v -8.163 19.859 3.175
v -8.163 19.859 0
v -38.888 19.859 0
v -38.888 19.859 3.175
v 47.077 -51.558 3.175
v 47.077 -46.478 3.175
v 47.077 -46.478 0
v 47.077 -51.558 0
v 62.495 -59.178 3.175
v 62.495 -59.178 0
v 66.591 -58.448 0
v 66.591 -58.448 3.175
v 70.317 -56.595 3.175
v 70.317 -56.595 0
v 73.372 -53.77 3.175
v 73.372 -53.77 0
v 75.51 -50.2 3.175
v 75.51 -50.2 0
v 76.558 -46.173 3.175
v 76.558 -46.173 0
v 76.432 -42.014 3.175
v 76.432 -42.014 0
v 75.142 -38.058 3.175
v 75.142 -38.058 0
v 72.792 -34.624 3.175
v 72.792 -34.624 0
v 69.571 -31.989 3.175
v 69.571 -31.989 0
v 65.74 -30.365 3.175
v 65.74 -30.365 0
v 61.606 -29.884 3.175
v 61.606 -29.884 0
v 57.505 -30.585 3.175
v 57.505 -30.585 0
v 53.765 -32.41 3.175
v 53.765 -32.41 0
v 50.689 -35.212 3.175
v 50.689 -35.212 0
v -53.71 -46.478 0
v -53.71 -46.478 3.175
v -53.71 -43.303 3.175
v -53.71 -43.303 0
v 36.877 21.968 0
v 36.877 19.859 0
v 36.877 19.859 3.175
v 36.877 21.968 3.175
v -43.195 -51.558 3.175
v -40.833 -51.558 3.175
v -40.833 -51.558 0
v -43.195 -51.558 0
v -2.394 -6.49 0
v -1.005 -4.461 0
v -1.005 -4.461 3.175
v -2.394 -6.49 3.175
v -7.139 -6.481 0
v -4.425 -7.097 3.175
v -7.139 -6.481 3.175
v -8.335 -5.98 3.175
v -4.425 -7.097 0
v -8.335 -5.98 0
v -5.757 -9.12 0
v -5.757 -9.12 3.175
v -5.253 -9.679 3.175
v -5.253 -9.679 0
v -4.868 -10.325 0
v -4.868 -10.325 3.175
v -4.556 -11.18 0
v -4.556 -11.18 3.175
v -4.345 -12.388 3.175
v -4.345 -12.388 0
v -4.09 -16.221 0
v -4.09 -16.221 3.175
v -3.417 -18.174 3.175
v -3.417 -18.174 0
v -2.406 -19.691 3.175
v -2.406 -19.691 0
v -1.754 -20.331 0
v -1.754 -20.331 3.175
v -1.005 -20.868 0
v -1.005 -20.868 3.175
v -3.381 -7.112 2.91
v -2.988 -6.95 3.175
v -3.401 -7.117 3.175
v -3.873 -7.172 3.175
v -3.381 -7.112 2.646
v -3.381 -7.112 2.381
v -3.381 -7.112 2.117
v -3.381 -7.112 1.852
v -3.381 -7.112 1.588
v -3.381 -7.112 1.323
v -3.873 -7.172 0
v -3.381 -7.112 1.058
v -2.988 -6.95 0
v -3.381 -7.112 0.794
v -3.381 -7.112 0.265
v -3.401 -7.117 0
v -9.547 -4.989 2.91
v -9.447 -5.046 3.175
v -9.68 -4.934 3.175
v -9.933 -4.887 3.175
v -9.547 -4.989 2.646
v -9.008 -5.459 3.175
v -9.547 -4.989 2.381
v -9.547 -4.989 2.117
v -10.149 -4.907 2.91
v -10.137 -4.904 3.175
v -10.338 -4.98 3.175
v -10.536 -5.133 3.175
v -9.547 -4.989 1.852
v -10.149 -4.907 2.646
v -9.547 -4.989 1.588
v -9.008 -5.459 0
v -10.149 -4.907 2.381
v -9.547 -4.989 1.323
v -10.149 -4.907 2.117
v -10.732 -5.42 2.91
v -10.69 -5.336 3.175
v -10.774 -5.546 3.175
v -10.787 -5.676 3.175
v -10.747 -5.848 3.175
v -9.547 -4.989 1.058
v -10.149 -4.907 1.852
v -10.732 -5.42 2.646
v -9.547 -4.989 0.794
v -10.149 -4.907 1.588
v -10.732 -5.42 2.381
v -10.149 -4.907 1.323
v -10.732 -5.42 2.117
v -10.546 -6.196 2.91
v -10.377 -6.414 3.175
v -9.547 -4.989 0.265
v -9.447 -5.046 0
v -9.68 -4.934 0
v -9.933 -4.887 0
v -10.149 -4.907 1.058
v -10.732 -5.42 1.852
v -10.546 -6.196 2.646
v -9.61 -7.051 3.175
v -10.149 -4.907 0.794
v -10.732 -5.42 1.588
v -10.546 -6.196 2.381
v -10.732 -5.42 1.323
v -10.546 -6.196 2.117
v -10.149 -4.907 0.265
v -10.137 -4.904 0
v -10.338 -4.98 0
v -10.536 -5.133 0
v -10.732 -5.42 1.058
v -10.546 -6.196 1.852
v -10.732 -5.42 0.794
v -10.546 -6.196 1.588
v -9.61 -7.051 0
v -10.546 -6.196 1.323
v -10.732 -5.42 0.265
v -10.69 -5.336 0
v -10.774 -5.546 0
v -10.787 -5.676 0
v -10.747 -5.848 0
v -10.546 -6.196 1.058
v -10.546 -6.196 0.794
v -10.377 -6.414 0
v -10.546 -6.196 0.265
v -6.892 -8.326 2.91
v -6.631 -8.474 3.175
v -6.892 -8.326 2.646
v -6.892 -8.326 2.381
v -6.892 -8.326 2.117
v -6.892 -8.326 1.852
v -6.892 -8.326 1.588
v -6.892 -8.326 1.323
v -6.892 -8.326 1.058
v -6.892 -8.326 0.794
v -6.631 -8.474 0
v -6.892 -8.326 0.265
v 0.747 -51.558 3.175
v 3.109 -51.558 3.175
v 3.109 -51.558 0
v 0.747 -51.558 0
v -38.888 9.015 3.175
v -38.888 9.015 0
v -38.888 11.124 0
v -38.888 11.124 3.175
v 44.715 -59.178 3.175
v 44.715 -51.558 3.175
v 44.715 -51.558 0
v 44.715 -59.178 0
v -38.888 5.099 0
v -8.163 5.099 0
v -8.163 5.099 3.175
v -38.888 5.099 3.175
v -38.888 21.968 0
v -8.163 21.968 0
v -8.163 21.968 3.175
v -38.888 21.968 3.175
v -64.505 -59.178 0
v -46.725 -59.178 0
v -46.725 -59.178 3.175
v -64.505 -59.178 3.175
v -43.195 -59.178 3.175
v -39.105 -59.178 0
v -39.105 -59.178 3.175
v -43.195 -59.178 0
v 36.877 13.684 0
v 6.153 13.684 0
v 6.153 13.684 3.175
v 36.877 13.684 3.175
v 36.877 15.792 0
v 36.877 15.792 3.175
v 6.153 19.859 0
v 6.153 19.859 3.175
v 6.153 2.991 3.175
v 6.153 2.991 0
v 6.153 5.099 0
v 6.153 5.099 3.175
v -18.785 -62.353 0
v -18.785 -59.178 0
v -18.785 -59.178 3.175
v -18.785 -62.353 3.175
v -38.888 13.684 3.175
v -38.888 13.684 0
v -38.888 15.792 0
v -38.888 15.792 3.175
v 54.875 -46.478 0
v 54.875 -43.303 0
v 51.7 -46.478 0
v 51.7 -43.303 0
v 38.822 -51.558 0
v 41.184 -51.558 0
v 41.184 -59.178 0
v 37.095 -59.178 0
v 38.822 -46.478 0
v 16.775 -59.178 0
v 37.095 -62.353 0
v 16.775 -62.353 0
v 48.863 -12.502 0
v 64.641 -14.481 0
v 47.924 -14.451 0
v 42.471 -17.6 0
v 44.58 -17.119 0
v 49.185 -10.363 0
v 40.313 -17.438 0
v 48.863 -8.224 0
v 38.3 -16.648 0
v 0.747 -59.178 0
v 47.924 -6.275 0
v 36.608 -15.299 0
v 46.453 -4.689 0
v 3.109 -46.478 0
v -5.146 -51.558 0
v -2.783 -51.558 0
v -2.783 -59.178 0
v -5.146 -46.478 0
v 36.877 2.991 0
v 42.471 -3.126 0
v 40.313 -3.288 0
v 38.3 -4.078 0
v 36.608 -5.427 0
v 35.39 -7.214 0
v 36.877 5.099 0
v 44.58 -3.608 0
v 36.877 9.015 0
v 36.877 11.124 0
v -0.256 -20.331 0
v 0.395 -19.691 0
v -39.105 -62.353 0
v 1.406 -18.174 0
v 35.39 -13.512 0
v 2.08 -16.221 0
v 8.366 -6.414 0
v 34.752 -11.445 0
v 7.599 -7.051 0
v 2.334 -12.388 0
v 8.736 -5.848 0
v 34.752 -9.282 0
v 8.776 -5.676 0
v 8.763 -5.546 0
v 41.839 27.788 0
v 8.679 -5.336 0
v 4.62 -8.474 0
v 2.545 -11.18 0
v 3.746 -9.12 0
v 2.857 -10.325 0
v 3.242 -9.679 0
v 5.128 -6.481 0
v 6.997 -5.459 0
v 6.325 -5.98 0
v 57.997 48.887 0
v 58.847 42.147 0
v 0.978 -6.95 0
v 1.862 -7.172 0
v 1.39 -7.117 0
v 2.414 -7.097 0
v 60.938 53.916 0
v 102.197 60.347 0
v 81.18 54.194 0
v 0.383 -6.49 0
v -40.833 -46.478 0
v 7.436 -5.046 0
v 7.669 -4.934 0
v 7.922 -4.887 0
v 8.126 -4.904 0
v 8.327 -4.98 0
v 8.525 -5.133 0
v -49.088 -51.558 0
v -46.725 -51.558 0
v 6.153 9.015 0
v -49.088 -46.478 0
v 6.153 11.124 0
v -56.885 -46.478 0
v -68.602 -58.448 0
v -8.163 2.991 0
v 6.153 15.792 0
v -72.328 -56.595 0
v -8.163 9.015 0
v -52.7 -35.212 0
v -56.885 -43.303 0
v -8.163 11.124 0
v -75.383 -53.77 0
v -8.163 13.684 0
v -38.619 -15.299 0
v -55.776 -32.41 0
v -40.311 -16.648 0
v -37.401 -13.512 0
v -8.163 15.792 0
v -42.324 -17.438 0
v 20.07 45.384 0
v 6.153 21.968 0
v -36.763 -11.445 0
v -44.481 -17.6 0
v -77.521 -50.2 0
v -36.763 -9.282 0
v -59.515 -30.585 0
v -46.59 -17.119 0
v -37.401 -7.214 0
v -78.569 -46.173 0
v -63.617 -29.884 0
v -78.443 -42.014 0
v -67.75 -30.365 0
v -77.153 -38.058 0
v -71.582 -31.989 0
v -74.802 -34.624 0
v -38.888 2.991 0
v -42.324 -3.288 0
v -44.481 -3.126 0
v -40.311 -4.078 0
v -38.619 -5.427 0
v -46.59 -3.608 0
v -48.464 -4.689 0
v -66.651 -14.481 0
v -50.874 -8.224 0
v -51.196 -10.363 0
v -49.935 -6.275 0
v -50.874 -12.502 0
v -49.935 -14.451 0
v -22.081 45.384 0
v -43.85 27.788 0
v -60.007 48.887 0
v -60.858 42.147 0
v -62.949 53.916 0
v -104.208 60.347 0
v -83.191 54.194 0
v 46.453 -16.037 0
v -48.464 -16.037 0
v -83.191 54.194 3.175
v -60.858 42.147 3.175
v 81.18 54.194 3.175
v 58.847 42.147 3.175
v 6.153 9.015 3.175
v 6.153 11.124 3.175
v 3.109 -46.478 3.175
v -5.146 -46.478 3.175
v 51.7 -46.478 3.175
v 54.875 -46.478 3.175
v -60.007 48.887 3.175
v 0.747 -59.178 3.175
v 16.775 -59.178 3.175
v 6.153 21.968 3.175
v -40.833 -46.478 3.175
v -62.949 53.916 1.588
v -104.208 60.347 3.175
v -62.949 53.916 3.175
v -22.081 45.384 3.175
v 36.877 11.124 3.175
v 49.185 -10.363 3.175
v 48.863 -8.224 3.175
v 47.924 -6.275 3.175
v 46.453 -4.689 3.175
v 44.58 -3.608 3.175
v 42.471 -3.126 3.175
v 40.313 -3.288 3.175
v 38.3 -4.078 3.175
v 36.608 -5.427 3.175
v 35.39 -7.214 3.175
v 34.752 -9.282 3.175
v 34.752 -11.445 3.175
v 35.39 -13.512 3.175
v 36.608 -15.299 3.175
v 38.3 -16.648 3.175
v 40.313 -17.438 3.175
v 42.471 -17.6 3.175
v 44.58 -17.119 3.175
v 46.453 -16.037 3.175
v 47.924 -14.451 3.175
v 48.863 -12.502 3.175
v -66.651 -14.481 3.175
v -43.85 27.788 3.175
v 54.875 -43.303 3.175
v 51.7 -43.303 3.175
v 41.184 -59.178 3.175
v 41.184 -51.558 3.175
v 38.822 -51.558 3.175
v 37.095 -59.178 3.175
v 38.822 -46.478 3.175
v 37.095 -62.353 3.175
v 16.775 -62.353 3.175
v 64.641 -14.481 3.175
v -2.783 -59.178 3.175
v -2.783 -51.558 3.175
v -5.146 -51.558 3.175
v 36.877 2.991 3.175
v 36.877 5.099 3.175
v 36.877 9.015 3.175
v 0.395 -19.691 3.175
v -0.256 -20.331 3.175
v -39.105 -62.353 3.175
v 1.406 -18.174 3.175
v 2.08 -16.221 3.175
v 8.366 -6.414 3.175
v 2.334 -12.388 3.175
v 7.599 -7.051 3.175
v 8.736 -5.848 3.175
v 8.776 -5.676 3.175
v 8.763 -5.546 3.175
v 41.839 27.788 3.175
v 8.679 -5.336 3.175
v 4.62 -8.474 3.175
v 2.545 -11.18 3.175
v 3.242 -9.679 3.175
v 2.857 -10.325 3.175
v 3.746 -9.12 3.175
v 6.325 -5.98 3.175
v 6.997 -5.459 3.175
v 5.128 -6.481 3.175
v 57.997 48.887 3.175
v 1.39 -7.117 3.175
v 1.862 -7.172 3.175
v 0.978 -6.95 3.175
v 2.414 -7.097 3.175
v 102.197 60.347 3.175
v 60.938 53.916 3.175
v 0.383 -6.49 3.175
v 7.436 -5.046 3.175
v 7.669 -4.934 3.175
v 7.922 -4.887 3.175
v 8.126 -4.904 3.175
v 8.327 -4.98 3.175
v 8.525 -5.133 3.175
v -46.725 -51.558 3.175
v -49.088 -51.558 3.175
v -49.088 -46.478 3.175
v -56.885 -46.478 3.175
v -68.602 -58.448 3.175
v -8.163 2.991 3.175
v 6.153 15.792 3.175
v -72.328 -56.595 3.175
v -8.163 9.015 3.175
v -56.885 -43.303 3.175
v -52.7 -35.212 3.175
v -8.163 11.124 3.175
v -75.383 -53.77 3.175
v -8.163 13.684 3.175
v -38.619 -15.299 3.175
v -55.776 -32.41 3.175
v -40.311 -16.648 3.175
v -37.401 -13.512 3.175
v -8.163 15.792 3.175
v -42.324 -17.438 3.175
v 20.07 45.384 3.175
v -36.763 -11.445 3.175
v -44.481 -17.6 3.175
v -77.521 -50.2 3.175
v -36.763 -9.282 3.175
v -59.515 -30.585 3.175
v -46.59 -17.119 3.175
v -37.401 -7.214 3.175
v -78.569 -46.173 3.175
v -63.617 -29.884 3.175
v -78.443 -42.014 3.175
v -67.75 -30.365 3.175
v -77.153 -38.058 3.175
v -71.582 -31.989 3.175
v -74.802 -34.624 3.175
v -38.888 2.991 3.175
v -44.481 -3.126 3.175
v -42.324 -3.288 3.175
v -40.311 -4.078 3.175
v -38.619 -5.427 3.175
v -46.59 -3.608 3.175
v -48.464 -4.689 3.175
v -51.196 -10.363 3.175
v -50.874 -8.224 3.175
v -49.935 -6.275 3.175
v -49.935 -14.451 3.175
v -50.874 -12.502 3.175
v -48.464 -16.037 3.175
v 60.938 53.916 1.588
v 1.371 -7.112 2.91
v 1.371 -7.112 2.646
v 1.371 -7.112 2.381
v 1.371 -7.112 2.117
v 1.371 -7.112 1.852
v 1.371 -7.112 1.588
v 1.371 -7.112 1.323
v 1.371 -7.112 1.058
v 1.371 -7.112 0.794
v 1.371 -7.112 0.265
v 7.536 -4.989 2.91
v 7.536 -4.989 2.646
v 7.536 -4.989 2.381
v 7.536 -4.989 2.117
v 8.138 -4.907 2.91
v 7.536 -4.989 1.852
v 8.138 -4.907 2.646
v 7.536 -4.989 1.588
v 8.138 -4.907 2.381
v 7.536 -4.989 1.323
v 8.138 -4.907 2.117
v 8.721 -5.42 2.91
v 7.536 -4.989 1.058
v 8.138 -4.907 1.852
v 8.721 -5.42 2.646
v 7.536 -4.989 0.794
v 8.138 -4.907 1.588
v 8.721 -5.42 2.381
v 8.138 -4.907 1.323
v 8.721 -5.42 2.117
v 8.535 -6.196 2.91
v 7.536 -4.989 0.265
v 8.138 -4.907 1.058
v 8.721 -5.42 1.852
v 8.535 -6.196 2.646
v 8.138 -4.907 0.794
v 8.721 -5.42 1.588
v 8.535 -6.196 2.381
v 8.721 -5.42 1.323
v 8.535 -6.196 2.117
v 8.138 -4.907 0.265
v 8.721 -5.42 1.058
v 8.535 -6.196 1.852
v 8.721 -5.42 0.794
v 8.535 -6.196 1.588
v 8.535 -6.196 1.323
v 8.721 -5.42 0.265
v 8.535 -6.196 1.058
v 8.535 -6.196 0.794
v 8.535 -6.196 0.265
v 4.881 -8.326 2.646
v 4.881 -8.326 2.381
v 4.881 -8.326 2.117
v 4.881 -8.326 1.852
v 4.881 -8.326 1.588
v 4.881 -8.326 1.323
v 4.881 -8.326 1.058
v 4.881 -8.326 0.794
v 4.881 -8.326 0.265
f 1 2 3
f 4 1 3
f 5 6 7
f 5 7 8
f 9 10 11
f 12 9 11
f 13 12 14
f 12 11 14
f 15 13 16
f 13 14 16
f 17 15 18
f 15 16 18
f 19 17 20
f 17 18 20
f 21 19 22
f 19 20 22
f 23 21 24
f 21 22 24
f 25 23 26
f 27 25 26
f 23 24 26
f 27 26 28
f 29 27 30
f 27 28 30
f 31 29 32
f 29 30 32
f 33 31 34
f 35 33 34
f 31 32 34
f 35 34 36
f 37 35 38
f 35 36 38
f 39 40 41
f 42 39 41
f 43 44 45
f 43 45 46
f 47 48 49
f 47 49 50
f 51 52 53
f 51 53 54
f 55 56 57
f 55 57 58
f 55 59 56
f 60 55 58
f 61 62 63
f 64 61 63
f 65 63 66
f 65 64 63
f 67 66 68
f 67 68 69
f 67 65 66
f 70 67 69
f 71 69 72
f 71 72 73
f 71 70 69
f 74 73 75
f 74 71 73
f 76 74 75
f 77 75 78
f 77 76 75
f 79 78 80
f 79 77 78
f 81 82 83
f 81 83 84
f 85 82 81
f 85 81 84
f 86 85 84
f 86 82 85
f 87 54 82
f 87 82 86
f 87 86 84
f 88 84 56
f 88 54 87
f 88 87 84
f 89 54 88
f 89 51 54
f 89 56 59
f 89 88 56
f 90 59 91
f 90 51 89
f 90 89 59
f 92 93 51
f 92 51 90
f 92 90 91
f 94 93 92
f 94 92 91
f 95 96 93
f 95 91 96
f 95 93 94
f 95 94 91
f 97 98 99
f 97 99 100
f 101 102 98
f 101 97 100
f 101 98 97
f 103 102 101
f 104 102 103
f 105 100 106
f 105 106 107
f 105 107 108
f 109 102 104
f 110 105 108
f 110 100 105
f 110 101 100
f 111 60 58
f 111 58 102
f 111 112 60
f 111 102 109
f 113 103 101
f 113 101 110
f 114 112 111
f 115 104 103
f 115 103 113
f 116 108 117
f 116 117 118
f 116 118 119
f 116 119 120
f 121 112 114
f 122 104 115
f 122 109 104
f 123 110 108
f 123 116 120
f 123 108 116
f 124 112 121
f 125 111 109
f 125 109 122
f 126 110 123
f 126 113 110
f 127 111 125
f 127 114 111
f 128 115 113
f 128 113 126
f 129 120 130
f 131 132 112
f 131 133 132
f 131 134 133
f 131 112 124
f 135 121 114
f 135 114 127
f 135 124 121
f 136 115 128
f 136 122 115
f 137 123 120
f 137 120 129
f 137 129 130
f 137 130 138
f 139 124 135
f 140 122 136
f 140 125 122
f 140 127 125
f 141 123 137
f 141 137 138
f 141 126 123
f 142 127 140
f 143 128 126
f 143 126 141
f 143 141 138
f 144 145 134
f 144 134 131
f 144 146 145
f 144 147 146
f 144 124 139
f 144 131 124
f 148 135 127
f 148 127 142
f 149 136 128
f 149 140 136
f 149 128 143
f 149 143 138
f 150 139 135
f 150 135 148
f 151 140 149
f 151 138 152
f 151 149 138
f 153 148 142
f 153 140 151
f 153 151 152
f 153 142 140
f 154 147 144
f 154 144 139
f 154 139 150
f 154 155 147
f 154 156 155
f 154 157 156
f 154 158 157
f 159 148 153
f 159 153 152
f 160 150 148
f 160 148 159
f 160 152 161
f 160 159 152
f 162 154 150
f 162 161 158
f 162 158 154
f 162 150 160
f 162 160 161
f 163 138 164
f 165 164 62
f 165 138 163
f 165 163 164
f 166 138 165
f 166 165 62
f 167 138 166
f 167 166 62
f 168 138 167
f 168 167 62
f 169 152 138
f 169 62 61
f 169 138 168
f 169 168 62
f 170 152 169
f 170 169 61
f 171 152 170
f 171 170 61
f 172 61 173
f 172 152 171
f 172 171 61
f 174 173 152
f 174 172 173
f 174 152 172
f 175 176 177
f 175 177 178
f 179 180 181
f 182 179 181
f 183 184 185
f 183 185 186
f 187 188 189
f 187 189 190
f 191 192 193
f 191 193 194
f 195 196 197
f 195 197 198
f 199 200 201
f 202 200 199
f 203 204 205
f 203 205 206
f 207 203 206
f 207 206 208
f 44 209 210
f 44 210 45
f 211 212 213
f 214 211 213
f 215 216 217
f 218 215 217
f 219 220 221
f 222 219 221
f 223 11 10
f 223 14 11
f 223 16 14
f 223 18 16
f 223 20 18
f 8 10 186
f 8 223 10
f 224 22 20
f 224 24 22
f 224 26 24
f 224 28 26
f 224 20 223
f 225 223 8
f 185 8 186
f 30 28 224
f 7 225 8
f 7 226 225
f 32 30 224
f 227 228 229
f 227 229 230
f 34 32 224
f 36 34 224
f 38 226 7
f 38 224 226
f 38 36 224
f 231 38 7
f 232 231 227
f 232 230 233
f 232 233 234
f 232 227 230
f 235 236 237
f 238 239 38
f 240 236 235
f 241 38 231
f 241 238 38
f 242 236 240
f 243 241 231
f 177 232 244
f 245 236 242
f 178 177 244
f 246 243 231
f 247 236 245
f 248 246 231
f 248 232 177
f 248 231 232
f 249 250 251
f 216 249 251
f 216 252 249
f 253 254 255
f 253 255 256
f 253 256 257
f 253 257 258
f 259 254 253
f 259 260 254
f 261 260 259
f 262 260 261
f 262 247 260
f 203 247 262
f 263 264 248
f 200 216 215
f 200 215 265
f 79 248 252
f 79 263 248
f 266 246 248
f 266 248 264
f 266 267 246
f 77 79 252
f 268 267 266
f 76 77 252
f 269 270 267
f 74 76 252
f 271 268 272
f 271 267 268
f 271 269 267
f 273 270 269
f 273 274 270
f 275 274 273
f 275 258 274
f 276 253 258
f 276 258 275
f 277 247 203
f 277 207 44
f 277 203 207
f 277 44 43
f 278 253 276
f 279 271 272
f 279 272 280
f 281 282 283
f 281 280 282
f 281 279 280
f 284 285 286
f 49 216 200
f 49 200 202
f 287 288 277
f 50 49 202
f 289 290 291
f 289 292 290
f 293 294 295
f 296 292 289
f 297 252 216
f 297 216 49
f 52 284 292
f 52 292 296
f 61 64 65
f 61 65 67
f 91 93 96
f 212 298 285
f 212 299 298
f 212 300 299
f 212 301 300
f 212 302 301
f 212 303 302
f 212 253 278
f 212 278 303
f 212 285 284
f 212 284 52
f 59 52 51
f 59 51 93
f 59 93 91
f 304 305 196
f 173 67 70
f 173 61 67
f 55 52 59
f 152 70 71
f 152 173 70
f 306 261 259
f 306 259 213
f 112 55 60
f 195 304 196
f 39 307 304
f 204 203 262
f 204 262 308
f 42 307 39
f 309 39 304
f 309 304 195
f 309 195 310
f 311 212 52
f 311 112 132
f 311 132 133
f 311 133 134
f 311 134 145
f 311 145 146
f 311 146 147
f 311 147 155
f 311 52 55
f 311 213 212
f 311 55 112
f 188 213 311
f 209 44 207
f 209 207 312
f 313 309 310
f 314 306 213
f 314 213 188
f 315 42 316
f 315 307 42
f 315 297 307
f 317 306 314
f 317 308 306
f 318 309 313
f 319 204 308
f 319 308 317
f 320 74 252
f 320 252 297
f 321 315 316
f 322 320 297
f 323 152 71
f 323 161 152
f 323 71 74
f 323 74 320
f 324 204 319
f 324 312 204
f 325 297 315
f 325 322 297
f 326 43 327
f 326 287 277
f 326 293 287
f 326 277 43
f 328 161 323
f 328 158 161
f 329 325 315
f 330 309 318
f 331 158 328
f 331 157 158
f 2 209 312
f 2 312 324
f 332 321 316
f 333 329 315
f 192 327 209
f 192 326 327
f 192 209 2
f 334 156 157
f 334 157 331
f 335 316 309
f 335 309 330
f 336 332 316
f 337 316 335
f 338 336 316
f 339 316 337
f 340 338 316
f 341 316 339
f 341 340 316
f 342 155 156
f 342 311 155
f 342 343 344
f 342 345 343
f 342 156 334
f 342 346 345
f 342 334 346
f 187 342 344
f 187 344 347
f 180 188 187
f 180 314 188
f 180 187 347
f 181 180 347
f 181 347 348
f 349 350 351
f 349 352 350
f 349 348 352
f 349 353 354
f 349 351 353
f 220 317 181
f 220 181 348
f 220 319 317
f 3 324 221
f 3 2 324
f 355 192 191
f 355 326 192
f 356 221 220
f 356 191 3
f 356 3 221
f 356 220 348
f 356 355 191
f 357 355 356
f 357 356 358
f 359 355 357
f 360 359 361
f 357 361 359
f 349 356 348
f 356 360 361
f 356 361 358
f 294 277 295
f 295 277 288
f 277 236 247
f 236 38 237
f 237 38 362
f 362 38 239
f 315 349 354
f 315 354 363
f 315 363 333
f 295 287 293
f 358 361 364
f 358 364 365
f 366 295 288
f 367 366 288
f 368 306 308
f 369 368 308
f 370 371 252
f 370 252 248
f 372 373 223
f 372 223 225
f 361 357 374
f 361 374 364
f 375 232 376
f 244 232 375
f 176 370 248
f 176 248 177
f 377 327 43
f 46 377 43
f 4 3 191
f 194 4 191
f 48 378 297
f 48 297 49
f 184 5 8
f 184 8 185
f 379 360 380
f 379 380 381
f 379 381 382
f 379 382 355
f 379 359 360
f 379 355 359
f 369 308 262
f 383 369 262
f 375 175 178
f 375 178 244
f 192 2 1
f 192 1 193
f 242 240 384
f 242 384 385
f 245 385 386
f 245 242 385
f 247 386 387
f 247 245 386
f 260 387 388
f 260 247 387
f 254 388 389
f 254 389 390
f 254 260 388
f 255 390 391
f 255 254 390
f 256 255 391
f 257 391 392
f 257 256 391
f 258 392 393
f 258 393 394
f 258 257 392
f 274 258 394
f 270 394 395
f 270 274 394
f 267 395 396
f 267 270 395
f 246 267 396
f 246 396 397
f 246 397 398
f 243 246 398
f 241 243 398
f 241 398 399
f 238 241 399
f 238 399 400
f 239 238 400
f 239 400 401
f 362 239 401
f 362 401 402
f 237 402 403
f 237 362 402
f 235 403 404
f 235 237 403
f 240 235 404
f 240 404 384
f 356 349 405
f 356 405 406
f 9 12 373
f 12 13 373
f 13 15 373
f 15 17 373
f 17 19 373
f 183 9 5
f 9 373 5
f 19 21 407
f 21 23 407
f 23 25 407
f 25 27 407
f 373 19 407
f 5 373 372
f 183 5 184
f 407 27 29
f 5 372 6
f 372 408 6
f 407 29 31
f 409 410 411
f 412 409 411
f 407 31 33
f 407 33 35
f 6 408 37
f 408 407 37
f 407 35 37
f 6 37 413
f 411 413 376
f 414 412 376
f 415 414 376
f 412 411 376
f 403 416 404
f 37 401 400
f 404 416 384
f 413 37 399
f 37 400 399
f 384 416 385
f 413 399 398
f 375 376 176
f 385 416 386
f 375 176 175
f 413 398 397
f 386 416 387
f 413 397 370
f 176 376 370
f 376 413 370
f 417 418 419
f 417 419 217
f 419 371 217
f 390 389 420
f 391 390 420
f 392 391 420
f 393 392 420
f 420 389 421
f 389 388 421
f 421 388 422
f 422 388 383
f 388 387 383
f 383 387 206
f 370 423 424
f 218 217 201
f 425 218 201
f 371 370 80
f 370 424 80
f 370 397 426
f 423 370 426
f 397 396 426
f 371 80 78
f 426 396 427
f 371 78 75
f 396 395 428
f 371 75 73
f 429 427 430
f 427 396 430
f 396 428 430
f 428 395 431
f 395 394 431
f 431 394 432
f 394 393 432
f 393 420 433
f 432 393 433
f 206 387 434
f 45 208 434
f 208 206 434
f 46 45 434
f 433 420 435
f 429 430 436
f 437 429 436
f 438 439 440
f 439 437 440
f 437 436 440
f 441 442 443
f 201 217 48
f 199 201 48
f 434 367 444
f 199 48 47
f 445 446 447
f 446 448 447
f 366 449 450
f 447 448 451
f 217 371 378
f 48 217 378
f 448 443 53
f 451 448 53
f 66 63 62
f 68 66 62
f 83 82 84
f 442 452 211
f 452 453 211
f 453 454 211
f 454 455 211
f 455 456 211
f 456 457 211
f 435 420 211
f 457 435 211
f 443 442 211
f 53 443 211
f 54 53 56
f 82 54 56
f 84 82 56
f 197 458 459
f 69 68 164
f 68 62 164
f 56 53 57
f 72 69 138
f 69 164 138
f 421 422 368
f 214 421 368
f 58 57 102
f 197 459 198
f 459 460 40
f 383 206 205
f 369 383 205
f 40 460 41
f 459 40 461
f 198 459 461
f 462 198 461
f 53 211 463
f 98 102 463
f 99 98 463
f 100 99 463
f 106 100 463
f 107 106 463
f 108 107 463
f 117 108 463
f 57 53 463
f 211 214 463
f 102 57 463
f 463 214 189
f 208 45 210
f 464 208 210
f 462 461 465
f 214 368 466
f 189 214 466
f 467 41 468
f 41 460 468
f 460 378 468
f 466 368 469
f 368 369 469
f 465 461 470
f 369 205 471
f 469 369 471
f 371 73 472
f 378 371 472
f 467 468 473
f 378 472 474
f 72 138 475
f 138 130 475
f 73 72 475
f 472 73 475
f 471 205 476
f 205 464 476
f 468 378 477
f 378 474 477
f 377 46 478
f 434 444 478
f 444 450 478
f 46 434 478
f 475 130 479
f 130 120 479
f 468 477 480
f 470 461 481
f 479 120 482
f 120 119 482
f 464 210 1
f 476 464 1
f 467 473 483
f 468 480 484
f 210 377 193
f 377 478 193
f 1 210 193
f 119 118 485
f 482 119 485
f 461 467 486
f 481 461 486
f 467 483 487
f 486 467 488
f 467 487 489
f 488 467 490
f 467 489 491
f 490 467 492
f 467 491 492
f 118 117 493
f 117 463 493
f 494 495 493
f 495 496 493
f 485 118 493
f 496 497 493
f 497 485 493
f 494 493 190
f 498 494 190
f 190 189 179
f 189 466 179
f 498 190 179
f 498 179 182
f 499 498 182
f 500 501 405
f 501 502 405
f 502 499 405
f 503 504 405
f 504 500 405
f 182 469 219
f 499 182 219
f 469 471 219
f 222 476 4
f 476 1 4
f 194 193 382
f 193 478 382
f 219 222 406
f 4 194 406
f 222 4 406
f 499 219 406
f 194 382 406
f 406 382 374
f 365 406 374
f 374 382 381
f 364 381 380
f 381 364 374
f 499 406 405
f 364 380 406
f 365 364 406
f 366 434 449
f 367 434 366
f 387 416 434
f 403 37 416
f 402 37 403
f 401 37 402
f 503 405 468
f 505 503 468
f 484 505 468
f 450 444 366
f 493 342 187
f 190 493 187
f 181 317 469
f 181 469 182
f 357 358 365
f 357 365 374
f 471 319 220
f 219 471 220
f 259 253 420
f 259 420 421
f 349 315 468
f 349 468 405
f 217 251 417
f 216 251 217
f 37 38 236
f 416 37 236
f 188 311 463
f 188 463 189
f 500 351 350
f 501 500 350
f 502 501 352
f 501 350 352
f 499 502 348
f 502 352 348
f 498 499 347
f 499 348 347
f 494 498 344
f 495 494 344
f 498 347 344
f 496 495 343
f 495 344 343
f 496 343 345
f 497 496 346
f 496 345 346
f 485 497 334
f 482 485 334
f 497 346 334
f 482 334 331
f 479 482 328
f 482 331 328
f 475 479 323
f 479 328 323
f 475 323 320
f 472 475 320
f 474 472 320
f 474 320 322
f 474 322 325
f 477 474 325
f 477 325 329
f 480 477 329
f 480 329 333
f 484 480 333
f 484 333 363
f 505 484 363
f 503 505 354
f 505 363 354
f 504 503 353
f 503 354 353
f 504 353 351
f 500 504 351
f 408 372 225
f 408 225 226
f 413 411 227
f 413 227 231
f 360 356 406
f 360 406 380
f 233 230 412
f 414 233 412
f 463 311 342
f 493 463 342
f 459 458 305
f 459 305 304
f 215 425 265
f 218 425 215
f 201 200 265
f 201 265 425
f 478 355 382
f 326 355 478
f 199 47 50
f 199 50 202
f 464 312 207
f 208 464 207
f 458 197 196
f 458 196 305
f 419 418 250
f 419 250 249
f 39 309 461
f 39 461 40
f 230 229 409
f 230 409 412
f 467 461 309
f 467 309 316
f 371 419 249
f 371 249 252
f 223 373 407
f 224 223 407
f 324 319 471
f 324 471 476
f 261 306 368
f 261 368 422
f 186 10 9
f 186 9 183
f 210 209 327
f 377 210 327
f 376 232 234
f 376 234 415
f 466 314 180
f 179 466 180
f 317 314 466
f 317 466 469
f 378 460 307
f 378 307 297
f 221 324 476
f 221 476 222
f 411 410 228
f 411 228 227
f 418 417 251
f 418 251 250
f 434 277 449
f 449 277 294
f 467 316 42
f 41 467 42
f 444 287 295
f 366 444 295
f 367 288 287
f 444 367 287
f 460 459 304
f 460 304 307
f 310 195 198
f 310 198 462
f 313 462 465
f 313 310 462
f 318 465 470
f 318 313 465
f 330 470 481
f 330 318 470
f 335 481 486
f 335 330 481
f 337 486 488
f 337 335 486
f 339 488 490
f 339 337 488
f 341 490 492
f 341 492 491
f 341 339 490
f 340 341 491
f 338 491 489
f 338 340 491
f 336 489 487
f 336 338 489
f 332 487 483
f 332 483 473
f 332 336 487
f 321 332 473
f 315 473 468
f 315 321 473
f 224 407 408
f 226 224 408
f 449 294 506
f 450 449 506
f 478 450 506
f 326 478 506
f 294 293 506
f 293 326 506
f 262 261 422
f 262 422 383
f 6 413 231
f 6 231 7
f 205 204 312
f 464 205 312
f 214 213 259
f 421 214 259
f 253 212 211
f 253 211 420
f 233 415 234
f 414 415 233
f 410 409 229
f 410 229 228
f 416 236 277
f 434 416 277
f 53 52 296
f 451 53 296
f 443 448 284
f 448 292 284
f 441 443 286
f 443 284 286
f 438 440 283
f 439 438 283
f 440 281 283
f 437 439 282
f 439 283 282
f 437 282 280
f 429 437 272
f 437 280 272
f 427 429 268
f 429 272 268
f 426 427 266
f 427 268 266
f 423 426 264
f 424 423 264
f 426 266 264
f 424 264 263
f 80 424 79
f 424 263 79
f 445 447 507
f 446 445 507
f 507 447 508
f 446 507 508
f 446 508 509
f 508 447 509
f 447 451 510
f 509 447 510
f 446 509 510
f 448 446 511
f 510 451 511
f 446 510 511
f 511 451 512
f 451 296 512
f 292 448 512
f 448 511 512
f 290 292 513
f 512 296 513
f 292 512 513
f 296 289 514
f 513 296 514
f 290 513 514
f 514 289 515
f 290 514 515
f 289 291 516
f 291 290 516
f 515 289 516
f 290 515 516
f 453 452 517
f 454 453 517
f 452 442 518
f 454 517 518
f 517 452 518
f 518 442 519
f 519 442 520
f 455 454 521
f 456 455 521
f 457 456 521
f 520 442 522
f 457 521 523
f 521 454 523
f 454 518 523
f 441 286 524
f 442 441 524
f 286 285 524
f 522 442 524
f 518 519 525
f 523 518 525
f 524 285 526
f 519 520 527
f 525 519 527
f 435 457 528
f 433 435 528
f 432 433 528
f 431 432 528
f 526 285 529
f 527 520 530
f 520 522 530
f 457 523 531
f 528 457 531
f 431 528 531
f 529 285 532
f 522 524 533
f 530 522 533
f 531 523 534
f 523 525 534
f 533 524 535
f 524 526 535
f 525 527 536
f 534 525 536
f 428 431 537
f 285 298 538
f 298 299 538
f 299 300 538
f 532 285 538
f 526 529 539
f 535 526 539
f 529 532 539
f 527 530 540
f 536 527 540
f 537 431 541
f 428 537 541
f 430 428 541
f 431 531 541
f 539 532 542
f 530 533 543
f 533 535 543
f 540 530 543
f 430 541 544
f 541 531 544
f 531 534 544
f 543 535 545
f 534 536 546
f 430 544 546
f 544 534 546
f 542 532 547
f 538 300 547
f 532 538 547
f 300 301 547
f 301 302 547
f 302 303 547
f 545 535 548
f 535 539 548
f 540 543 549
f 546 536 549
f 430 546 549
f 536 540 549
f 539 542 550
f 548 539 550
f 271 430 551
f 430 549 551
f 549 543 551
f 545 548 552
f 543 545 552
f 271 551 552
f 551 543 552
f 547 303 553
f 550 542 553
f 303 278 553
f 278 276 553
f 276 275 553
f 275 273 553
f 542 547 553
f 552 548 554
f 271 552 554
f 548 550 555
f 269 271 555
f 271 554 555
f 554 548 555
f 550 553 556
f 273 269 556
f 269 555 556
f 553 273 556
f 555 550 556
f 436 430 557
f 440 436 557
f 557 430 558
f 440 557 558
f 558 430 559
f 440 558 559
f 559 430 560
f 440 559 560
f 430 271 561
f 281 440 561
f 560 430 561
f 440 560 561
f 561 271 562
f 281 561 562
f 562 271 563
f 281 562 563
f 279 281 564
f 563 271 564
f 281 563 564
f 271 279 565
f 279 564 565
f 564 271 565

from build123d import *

# Parameters (mm, degrees)
BOSS_EXTRUDE1_DEPTH = 3.175
SKETCH6_R           = 7.257154646
CUT_EXTRUDE5_DEPTH  = 3.175
SKETCH9_W           = 3.175
SKETCH9_H           = 3.175
CUT_EXTRUDE7_DEPTH  = 3.175
SKETCH8_W           = 30.724562626
SKETCH8_H           = 2.108548415
SKETCH8_H_2         = 2.108548416
CUT_EXTRUDE6_DEPTH  = 3.175
SKETCH10_W          = 20.32
SKETCH10_H          = 3.175
BOSS_EXTRUDE2_DEPTH = 3.175
CUT_EXTRUDE8_DEPTH  = 3.175


with BuildPart() as part:
    # Sketch1 → Boss-Extrude1 (new body)
    with BuildSketch(Plane.XY):
        with BuildLine():
            Line((41.839101774, 27.787790455), (102.197242912, 60.347139319))
            add(Edge.make_bspline(
                [(102.197242912, 60.347139319), (60.742723961, 54.966910385), (20.07049128, 45.384405553)],
                knots=[0, 0, 0, 1, 1, 1], degree=2))
            Line((20.07049128, 45.384405553), (-1.005398806, 45.384405553))
            Line((-1.005398806, 45.384405553), (-1.005398806, -59.17809155))
            Line((-1.005398806, -59.17809155), (62.494601194, -59.17809155))
            ThreePointArc((62.494601194, -59.17809155), (75.141770938, -38.057520175), (50.68909305, -35.212176281))
            Line((50.68909305, -35.212176281), (64.64061298, -14.48138505))
            Line((64.64061298, -14.48138505), (41.839101774, 27.787790455))
        make_face()
    boss_extrude1 = extrude(amount=BOSS_EXTRUDE1_DEPTH)

    # Sketch6 → Cut-Extrude5 (cut)
    with BuildSketch(Plane.XY):
        with Locations((41.928309242, -10.363128131)):
            Circle(SKETCH6_R)
        Polygon((57.996590192, 48.887210307), (81.18043036, 54.194354442), (58.847058779, 42.146931793), align=None)
        with BuildLine():
            Line((-1.005398806, -4.460766145), (-1.005398806, -20.868472516))
            add(Edge.make_bspline(
                [(-1.005398806, -4.460766145), (0.91009084, -8.087601817), (2.163575929, -6.944318239), (3.759225089, -6.904333812), (6.982497489, -5.965665574), (7.107924345, -4.954032148), (8.383749268, -4.7792984), (8.858412265, -5.597884514), (8.059934477, -7.266476525), (5.387533009, -7.743309848), (2.87598619, -9.738386244), (2.165758509, -12.437670072), (2.502299568, -16.460193064), (0.929673731, -19.700918611), (-1.005398806, -20.868472516)],
                knots=[0, 0, 0, 0, 0.201890753, 0.228999657, 0.271089043, 0.343451588, 0.384030867, 0.405551279, 0.412267992, 0.551583373, 0.622208689, 0.702728492, 0.796795757, 1, 1, 1, 1], degree=3))
        make_face()
    cut_extrude5 = extrude(amount=CUT_EXTRUDE5_DEPTH, mode=Mode.SUBTRACT)

    # Sketch9 → Cut-Extrude7 (cut)
    with BuildSketch(Plane(origin=(0, 0, 0), x_dir=(-1, 0, 0), z_dir=(0, 0, -1))):
        with Locations((-53.287101194, -44.89059155)):
            Rectangle(SKETCH9_W, SKETCH9_H)
    cut_extrude7 = extrude(amount=-CUT_EXTRUDE7_DEPTH, mode=Mode.SUBTRACT)

    # Sketch8 → Cut-Extrude6 (cut)
    with BuildSketch(Plane.XY):
        with Locations((-23.52574119, 20.913238549)):
            Rectangle(SKETCH8_W, SKETCH8_H)
        with Locations((-23.52574119, 14.738203903)):
            Rectangle(SKETCH8_W, SKETCH8_H_2)
        with Locations((-23.52574119, 10.069275269)):
            Rectangle(SKETCH8_W, SKETCH8_H)
        with Locations((-23.52574119, 4.044851224)):
            Rectangle(SKETCH8_W, SKETCH8_H_2)
        with Locations((21.514943577, 4.044851224)):
            Rectangle(SKETCH8_W, SKETCH8_H_2)
        with Locations((21.514943577, 10.069275269)):
            Rectangle(SKETCH8_W, SKETCH8_H)
        with Locations((21.514943577, 14.738203903)):
            Rectangle(SKETCH8_W, SKETCH8_H_2)
        with Locations((21.514943577, 20.913238549)):
            Rectangle(SKETCH8_W, SKETCH8_H)
    cut_extrude6 = extrude(amount=CUT_EXTRUDE6_DEPTH, mode=Mode.SUBTRACT)

    # Mirror4: Boss-Extrude1, Cut-Extrude5, Cut-Extrude7, Cut-Extrude6 across plane
    add(boss_extrude1.mirror(Plane(origin=(-1.005398806, 0, 3.175), x_dir=(0, 0, 1), z_dir=(1, 0, 0))))
    add(cut_extrude5.mirror(Plane(origin=(-1.005398806, 0, 3.175), x_dir=(0, 0, 1), z_dir=(1, 0, 0))), mode=Mode.SUBTRACT)
    add(cut_extrude7.mirror(Plane(origin=(-1.005398806, 0, 3.175), x_dir=(0, 0, 1), z_dir=(1, 0, 0))), mode=Mode.SUBTRACT)
    add(cut_extrude6.mirror(Plane(origin=(-1.005398806, 0, 3.175), x_dir=(0, 0, 1), z_dir=(1, 0, 0))), mode=Mode.SUBTRACT)

    # Sketch10 → Boss-Extrude2 (add)
    with BuildSketch(Plane.XZ.offset(59.17809155)):
        with Locations((-28.945398806, 1.5875)):
            Rectangle(SKETCH10_W, SKETCH10_H)
        with Locations((26.934601194, 1.5875)):
            Rectangle(SKETCH10_W, SKETCH10_H)
    extrude(amount=BOSS_EXTRUDE2_DEPTH)

    # Sketch11 → Cut-Extrude8 (cut)
    with BuildSketch(Plane.XY.offset(3.175)):
        Polygon((-49.087598806, -51.55809155), (-49.087598806, -46.47809155), (-40.832598806, -46.47809155), (-40.832598806, -51.55809155), (-43.194798806, -51.55809155), (-43.194798806, -59.17809155), (-46.725398806, -59.17809155), (-46.725398806, -51.55809155), align=None)
        Polygon((-5.145598806, -51.55809155), (-5.145598806, -46.47809155), (3.109401194, -46.47809155), (3.109401194, -51.55809155), (0.747201194, -51.55809155), (0.747201194, -59.17809155), (-2.783398806, -59.17809155), (-2.783398806, -51.55809155), align=None)
        Polygon((38.821801194, -51.55809155), (38.821801194, -46.47809155), (47.076801194, -46.47809155), (47.076801194, -51.55809155), (44.714601194, -51.55809155), (44.714601194, -59.17809155), (41.184001194, -59.17809155), (41.184001194, -51.55809155), align=None)
    extrude(amount=-CUT_EXTRUDE8_DEPTH, mode=Mode.SUBTRACT)


solid = part.part
